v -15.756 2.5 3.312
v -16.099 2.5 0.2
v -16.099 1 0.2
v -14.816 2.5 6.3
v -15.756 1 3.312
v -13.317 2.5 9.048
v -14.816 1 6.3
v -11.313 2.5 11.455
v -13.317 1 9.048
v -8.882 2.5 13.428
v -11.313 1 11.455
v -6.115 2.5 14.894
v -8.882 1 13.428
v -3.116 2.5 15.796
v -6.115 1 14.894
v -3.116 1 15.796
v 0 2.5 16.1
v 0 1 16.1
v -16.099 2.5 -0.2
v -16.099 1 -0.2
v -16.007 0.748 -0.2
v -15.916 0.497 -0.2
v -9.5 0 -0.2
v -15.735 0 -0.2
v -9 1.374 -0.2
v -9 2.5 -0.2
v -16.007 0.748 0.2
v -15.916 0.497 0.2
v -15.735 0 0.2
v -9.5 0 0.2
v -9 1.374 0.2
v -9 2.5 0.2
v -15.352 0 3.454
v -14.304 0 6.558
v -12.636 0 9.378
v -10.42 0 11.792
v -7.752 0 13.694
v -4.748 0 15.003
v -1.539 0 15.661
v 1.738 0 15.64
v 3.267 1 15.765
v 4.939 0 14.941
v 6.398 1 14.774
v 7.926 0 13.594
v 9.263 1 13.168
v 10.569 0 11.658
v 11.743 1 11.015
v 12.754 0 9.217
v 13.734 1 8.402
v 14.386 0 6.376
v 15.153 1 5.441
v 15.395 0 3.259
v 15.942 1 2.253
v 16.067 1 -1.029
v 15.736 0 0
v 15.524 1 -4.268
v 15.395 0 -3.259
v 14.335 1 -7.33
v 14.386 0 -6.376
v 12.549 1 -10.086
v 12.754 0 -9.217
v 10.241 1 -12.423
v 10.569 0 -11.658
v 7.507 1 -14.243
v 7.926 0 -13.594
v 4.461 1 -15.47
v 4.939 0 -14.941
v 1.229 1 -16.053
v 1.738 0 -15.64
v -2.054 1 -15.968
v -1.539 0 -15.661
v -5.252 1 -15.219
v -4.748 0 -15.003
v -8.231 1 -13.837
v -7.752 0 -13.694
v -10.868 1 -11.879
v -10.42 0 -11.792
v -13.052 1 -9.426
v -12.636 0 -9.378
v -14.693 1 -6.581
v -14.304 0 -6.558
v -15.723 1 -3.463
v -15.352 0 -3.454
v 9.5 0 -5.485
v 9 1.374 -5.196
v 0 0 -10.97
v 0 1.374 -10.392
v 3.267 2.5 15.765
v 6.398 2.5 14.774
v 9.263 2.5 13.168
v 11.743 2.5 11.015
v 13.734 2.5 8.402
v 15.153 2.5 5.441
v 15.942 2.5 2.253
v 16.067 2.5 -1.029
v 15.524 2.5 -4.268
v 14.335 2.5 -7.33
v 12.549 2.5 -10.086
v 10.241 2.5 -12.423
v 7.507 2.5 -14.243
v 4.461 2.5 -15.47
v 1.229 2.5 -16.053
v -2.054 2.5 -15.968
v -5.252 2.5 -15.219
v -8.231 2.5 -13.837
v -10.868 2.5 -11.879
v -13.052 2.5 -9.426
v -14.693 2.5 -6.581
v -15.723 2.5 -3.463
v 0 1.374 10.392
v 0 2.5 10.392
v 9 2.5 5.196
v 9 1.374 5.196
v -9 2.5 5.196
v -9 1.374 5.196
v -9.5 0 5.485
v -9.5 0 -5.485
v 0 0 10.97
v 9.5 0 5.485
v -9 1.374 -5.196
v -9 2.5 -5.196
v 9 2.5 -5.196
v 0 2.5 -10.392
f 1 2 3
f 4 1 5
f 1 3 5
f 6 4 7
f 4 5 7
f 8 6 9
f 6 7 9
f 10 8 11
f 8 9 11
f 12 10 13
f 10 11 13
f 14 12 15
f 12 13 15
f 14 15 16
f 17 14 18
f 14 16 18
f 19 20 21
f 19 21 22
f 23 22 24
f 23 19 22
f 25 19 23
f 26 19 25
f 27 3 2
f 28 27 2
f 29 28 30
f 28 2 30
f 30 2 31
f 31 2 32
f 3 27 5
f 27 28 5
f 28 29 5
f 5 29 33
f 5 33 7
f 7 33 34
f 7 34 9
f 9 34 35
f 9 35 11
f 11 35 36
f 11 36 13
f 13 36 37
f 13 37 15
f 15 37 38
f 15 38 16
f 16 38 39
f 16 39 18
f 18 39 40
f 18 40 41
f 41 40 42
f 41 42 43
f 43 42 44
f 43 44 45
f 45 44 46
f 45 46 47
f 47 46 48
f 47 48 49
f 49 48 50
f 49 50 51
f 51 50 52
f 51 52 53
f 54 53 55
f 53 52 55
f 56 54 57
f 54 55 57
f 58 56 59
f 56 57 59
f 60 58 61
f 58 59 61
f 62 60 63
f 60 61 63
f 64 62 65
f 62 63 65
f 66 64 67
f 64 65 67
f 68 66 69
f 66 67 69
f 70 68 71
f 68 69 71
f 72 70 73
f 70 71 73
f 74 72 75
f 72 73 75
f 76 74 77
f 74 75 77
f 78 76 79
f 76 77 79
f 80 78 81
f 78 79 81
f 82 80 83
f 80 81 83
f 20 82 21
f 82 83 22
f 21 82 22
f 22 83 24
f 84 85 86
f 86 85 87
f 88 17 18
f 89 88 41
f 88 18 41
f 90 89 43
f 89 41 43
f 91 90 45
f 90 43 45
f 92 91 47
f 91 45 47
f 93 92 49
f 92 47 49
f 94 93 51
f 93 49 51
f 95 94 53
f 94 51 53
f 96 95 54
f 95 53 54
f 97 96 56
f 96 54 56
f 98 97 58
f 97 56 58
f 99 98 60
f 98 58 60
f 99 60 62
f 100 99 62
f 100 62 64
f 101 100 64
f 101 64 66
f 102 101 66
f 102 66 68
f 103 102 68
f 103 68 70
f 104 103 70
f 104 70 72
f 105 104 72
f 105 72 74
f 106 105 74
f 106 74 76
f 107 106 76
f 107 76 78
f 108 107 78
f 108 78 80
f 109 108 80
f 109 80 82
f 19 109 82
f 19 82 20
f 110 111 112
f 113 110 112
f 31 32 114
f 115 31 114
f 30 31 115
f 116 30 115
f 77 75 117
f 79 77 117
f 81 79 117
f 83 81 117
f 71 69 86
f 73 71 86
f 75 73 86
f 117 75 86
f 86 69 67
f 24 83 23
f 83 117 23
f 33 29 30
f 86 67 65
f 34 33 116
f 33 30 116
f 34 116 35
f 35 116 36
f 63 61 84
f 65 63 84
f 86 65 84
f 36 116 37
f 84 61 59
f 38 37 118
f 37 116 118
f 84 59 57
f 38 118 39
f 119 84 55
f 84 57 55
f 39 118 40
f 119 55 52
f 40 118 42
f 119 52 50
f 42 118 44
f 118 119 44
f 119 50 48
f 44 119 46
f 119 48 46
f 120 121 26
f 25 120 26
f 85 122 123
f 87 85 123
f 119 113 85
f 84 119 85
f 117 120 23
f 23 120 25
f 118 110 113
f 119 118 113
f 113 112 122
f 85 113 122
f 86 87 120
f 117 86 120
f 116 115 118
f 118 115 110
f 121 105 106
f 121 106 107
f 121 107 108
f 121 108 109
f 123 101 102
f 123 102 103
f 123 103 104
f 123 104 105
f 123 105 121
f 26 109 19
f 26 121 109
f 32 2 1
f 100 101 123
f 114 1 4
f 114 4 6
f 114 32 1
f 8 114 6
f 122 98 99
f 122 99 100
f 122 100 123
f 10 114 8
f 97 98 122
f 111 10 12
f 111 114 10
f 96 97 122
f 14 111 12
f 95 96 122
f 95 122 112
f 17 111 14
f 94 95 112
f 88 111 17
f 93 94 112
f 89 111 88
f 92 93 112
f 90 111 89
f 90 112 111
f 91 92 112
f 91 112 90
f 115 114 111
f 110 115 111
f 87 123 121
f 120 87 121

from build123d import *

# Parameters (mm, degrees)
SKETCH_1_R          = 16.1
EXTRUDE_1_DEPTH     = 2.5
CUT_EXTRUDE_1_DEPTH = 23.905676152
SKETCH_3_W          = 7.1
SKETCH_3_H          = 0.4
CUT_EXTRUDE_2_DEPTH = 23.905676152
CHAMFER_1_SIZE      = 1
CHAMFER_1_SIZE2     = 0.363970234
CHAMFER_2_SIZE      = 0.5
CHAMFER_2_SIZE2     = 1.37373871


with BuildPart() as part:
    # Эскиз1 → Бобышка-Вытянуть1 (new body)
    with BuildSketch(Plane(origin=(0, 0, 0), x_dir=(1, 0, 0), z_dir=(0, 1, 0))):
        with Locations(Location((0, 0, 0), (0, 0, 270))):
            Circle(SKETCH_1_R)
    extrude(amount=EXTRUDE_1_DEPTH)

    # Эскиз2 → Вырез-Вытянуть1 (cut, through all)
    with BuildSketch(Plane(origin=(0, 2.5, 0), x_dir=(1, 0, 0), z_dir=(0, 1, 0))):
        Polygon((0, 10.392304845), (-9, 5.196152423), (-9, -5.196152423), (0, -10.392304845), (9, -5.196152423), (9, 5.196152423), align=None)
    extrude(amount=-CUT_EXTRUDE_1_DEPTH, mode=Mode.SUBTRACT)

    # Эскиз3 → Вырез-Вытянуть2 (cut, through all)
    with BuildSketch(Plane(origin=(0, 2.5, 0), x_dir=(1, 0, 0), z_dir=(0, 1, 0))):
        with Locations((-12.55, 0)):
            Rectangle(SKETCH_3_W, SKETCH_3_H)
    extrude(amount=-CUT_EXTRUDE_2_DEPTH, mode=Mode.SUBTRACT)

    # Фаска1
    chamfer_1_edges = [part.edges().sort_by_distance(p)[0] for p in [
        (11.45491161, 0, -11.313487526),
    ]]
    chamfer_1_side = [part.faces().sort_by_distance(p)[0] for p in [
        (11.45491161, 1.25, -11.313487526),
    ]]
    chamfer(chamfer_1_edges, length=CHAMFER_1_SIZE, length2=CHAMFER_1_SIZE2, reference=chamfer_1_side[0])

    # Фаска2
    chamfer_2_edges = [part.edges().sort_by_distance(p)[0] for p in [
        (4.5, 0, -7.794228634),
        (9, 0, 0),
        (4.5, 0, 7.794228634),
        (-4.5, 0, 7.794228634),
        (-9, 0, -2.698076211),
        (-4.5, 0, -7.794228634),
        (-9, 0, 2.698076211),
    ]]
    chamfer_2_side = [part.faces().sort_by_distance(p)[0] for p in [
        (-12.367379373, 0, -0.245073147),
    ]]
    chamfer(chamfer_2_edges, length=CHAMFER_2_SIZE, length2=CHAMFER_2_SIZE2, reference=chamfer_2_side[0])


solid = part.part
